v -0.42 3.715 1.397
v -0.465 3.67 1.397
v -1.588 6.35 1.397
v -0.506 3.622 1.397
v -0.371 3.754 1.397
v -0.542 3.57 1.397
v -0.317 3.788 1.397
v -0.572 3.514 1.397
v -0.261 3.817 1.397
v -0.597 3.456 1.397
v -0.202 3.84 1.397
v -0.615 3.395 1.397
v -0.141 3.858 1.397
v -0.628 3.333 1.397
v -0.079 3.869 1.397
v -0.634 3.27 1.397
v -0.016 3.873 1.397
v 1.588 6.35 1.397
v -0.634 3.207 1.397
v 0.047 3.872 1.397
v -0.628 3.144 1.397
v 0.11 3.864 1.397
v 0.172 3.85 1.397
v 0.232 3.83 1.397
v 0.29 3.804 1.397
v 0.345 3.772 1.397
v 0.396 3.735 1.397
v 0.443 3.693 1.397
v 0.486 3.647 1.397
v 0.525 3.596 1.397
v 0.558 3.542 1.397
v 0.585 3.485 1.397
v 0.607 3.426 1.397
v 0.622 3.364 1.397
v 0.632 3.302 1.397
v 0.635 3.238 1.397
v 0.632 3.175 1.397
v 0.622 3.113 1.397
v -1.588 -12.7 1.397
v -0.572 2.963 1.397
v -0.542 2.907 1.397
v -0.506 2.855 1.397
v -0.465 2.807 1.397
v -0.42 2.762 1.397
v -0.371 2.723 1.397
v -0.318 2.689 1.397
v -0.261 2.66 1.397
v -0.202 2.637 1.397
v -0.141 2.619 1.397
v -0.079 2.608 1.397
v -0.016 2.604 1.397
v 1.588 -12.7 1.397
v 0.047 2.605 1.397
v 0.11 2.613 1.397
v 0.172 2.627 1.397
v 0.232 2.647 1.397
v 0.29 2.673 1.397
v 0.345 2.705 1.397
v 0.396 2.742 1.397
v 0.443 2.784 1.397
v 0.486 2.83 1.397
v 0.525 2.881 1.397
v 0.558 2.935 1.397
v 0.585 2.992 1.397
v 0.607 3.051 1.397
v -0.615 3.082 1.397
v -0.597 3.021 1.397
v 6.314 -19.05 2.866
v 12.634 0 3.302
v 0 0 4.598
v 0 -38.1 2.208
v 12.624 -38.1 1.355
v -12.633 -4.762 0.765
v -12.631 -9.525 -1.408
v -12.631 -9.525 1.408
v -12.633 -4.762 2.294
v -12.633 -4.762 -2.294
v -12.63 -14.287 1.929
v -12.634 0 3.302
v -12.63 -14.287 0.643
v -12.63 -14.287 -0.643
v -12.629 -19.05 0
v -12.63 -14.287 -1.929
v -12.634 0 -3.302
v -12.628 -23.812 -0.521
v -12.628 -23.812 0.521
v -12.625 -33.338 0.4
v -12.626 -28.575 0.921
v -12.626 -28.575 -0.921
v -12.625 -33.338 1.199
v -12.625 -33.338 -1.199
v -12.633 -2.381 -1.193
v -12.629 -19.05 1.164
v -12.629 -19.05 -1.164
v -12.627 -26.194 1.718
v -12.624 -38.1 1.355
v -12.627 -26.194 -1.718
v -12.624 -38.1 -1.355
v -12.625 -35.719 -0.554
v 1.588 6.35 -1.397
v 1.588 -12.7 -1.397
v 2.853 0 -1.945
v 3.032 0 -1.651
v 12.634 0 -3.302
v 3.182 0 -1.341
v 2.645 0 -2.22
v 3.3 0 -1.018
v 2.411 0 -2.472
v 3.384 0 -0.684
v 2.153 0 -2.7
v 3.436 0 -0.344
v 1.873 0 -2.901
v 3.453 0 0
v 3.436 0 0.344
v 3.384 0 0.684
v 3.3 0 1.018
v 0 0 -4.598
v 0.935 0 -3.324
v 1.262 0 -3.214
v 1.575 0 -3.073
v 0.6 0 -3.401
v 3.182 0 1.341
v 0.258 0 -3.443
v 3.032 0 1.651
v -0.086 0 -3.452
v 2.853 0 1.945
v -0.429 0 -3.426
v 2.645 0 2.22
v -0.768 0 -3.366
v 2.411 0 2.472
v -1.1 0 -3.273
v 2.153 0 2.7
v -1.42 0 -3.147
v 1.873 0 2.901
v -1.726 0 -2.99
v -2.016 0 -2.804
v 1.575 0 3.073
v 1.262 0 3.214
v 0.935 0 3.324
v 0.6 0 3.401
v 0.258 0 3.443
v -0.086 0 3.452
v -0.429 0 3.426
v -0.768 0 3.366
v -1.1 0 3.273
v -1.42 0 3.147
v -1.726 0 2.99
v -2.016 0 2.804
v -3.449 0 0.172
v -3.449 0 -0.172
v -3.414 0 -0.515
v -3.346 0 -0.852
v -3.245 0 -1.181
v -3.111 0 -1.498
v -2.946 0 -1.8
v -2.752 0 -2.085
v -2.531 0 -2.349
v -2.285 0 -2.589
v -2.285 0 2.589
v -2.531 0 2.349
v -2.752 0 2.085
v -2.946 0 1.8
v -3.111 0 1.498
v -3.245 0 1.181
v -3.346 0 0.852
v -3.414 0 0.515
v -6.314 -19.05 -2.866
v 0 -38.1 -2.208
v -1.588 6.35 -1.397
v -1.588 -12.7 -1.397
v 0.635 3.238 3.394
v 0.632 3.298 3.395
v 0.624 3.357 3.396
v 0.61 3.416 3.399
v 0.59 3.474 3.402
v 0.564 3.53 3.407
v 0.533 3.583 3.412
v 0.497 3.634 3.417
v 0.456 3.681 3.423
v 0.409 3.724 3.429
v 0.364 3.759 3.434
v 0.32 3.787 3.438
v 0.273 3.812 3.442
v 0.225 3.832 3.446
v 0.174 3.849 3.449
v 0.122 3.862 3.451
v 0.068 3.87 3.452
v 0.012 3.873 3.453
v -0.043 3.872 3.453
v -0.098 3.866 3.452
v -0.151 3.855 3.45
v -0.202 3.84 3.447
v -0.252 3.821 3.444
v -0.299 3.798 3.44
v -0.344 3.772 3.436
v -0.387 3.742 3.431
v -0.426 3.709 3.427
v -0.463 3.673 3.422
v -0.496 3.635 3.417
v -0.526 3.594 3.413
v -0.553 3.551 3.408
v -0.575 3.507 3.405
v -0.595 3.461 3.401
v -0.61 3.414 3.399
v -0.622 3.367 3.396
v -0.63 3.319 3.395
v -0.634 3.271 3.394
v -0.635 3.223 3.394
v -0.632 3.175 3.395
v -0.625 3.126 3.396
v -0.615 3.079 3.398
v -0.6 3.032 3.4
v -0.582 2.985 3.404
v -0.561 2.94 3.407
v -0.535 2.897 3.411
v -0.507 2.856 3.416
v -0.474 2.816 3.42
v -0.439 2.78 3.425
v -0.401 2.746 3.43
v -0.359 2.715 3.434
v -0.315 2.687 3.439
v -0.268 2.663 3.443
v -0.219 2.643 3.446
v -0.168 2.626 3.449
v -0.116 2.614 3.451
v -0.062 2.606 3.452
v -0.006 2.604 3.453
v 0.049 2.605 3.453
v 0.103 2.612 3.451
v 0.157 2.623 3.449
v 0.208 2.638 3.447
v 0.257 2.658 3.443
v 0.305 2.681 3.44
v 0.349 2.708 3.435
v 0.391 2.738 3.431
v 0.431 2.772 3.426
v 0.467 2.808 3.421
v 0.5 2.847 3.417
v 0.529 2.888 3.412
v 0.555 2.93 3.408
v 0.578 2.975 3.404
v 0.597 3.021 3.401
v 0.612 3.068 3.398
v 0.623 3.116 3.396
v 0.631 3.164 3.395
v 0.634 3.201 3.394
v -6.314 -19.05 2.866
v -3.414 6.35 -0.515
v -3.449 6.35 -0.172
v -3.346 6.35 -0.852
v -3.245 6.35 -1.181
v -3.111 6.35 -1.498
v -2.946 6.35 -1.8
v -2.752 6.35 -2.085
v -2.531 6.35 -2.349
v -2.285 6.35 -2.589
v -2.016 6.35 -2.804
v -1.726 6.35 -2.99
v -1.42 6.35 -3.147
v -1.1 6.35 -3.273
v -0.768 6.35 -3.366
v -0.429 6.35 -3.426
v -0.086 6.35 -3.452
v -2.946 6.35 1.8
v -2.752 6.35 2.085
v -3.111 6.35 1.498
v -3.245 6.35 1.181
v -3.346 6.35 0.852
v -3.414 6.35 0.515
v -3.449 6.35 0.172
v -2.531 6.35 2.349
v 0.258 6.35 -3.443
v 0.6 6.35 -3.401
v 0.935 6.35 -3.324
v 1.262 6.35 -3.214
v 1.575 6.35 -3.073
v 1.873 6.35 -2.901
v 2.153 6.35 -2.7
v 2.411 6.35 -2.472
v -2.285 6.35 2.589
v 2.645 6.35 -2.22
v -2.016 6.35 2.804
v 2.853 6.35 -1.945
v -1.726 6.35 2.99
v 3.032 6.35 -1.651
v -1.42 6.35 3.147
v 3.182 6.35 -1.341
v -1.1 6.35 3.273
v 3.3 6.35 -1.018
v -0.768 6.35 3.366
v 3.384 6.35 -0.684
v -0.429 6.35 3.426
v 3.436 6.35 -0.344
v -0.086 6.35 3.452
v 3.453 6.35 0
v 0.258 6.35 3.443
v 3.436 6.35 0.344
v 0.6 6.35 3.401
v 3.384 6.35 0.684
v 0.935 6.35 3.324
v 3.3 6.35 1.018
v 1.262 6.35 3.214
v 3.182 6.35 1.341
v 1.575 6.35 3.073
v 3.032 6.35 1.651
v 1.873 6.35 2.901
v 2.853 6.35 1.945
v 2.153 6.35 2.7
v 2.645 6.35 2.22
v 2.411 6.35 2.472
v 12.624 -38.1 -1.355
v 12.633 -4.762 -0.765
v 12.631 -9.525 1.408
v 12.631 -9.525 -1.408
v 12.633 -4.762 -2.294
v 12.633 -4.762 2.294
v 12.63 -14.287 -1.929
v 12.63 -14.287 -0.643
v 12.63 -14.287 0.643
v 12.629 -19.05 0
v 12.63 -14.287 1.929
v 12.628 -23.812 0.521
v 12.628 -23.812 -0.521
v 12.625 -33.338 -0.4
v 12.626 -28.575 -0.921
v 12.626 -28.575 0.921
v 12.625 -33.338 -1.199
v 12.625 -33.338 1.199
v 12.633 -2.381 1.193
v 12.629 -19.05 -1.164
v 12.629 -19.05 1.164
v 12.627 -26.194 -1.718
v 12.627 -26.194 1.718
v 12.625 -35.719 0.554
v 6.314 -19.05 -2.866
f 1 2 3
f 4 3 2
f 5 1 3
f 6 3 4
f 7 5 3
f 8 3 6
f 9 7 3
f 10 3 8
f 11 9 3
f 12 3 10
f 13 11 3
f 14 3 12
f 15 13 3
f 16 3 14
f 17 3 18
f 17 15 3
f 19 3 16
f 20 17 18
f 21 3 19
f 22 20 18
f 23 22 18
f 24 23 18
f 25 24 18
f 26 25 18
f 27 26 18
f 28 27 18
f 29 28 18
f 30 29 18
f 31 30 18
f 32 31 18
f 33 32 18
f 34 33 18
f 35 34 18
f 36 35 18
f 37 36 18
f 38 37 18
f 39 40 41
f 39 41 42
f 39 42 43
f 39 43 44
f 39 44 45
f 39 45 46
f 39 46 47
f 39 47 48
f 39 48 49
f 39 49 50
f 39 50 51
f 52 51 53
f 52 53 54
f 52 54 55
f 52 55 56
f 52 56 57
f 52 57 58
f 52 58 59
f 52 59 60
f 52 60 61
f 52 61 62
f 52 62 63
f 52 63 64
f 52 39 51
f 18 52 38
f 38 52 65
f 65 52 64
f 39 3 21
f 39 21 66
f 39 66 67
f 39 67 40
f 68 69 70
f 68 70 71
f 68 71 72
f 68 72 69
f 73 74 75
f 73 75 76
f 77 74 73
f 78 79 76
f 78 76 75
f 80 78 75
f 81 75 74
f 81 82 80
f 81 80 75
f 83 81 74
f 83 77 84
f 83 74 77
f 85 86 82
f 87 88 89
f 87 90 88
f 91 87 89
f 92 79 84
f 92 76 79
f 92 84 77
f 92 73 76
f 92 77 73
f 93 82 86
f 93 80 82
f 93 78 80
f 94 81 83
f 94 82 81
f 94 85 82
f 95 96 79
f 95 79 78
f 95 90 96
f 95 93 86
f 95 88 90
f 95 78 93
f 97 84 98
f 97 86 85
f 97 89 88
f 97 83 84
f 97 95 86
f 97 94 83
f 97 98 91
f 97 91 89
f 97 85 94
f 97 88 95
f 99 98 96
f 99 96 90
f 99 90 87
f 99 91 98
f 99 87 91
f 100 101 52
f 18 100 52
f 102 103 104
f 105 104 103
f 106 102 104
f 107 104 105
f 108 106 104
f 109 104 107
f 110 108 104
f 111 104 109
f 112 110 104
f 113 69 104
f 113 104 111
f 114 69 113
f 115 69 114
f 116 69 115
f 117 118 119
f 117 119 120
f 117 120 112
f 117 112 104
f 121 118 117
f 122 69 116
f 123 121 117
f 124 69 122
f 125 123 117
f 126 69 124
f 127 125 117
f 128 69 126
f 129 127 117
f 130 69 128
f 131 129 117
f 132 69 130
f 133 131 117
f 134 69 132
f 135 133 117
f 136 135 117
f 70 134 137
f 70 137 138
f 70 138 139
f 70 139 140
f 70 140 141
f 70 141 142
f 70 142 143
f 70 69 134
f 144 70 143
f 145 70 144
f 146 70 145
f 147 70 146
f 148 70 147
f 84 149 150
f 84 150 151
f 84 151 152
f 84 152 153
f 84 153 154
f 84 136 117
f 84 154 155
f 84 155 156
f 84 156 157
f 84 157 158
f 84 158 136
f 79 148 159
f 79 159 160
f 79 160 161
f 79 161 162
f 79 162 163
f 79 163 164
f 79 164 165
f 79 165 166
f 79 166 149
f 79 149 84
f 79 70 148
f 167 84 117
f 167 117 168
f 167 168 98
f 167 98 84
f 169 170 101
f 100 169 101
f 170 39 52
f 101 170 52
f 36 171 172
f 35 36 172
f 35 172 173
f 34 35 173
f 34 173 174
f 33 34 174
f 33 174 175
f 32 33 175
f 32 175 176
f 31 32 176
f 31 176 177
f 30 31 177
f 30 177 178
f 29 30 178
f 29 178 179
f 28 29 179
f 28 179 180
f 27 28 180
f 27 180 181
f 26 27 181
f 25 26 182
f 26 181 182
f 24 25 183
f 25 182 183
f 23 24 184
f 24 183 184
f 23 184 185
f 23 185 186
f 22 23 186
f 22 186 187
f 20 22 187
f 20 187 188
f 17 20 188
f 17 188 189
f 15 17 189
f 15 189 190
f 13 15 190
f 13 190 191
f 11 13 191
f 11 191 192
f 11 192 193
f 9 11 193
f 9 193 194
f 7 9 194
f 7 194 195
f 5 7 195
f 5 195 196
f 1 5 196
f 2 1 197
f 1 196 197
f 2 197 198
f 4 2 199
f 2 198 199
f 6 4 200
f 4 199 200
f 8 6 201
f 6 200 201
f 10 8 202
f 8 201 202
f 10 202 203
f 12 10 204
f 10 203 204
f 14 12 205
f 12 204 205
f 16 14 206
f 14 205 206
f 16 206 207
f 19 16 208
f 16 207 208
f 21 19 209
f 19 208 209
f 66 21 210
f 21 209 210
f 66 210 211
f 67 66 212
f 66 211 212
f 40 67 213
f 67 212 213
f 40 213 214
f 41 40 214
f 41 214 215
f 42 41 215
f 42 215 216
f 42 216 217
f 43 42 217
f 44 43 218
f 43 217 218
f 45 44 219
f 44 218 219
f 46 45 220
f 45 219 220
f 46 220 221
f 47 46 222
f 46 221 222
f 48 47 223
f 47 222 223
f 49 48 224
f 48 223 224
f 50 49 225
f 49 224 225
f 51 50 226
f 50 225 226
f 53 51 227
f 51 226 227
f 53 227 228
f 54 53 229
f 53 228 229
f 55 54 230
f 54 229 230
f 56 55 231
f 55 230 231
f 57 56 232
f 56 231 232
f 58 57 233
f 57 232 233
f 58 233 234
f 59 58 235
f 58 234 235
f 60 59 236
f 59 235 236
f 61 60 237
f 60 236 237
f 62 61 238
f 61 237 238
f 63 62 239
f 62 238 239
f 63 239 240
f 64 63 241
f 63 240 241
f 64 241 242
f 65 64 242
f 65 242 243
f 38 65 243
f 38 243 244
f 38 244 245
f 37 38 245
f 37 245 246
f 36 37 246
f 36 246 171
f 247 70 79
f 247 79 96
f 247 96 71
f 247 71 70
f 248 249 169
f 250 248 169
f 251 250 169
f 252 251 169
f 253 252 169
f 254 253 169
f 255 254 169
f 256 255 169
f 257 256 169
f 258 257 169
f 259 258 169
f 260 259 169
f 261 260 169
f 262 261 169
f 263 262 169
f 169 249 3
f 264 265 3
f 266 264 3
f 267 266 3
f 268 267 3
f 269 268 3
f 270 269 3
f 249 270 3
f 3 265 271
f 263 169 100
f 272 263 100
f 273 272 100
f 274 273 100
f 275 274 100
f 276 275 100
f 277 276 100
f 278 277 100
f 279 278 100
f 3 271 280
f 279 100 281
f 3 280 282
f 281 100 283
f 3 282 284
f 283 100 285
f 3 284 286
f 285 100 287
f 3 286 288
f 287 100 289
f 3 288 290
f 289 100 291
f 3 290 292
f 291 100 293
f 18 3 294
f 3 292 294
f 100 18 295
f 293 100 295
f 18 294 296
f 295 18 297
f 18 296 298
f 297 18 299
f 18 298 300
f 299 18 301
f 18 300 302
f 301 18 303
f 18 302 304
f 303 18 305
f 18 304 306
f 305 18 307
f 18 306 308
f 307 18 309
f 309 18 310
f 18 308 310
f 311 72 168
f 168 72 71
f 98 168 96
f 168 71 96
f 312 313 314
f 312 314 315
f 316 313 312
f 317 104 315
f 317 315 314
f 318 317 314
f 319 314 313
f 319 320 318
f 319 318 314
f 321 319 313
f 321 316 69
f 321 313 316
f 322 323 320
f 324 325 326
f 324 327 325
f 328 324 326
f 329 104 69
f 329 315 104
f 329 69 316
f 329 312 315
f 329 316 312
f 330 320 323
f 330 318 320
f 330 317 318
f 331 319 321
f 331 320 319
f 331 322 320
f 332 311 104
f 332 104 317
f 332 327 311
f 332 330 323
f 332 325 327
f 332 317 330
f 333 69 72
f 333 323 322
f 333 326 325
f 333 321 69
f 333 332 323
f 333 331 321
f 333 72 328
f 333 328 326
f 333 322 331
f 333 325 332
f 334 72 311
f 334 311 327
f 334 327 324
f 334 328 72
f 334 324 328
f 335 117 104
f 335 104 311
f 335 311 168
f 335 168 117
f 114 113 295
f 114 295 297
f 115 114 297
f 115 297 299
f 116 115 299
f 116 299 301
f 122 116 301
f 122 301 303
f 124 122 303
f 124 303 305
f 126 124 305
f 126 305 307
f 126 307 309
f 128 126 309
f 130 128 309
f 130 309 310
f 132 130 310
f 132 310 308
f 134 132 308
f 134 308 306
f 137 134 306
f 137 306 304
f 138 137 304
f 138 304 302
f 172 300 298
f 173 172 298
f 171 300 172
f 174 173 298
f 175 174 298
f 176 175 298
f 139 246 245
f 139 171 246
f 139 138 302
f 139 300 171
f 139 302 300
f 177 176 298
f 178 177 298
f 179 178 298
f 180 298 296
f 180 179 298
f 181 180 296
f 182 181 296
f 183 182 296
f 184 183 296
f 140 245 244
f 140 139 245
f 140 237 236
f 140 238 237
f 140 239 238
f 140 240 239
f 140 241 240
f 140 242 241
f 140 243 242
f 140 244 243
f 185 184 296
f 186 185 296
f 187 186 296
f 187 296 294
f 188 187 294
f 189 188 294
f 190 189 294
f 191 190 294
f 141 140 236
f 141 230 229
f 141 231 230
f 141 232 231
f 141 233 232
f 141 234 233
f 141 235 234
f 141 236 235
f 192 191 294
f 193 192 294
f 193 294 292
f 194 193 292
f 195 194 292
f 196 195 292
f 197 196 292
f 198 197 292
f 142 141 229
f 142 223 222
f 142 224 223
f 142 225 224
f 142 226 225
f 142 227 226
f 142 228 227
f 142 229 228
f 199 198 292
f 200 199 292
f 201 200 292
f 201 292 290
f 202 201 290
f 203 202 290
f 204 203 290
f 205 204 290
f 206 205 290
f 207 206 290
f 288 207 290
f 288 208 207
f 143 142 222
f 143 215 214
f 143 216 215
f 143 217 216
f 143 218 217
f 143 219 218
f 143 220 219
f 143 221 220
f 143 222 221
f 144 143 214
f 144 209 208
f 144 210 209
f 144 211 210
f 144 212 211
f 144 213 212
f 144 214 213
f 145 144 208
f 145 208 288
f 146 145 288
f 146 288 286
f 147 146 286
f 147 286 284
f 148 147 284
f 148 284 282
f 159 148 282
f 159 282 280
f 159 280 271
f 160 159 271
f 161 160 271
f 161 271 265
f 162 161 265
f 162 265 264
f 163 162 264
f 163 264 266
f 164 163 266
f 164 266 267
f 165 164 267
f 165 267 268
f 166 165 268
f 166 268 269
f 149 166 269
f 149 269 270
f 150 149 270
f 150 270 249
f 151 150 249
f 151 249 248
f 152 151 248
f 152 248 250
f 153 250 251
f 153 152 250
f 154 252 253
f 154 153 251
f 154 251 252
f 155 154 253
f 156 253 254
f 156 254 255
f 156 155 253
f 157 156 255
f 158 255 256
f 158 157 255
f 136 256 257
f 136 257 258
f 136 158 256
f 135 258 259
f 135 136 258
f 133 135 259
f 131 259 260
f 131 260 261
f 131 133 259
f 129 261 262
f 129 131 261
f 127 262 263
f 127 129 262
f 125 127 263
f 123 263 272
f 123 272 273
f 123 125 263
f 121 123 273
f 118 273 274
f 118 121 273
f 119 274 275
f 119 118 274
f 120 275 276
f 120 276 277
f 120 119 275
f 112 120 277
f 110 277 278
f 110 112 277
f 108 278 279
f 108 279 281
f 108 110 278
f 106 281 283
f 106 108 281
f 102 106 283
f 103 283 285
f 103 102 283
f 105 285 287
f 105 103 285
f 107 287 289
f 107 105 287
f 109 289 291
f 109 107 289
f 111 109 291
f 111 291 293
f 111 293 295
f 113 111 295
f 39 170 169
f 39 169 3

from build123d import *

# Parameters (mm, degrees)
F4_R          = 3.4529620344
F5_DEPTH      = 6.35
F6_W          = 3.175
F6_H          = 2.794
F7_DEPTH      = 25.4
F7_DEPTH_BACK = 12.7
F9_R          = 0.635
F10_DEPTH     = 6.35


with BuildPart() as f3:
    # F1 (on Front) → F3 section 0
    with BuildSketch(Plane.XZ):
        Polygon((12.6337242704, 3.302), (0, 4.5977665918), (-12.6337242704, 3.302), (-12.6337242704, 0), (-12.6337242704, -3.302), (0, -4.5977665918), (12.6337242704, -3.302), (12.6337242704, 0), align=None)
    # F2 (on offset) → F3 section 1
    with BuildSketch(Plane.XZ.offset(38.1)):
        Polygon((12.6239405945, -1.3549544383), (12.6239405945, 0), (12.6239405945, 1.3549544383), (0, 2.2075881716), (-12.6239405945, 1.3549544383), (-12.6239405945, 0), (-12.6239405945, -1.3549544383), (0, -2.2075881716), align=None)
    loft()

    # F4 (on Front) → F5 (join)
    with BuildSketch(Plane.XZ):
        Circle(F4_R)
    extrude(amount=-F5_DEPTH)

    # F6 (on Front) → F7 (cut, two sides)
    with BuildSketch(Plane.XZ) as f7_sk:
        Rectangle(F6_W, F6_H)
    extrude(amount=-F7_DEPTH, mode=Mode.SUBTRACT)
    extrude(f7_sk.sketch, amount=F7_DEPTH_BACK, mode=Mode.SUBTRACT)

    # F9 (on offset) → F10 (cut)
    with BuildSketch(Plane.XY.offset(6.35)):
        with Locations((0, 3.2384919468)):
            Circle(F9_R)
    extrude(amount=-F10_DEPTH, mode=Mode.SUBTRACT)


solid = f3.part
